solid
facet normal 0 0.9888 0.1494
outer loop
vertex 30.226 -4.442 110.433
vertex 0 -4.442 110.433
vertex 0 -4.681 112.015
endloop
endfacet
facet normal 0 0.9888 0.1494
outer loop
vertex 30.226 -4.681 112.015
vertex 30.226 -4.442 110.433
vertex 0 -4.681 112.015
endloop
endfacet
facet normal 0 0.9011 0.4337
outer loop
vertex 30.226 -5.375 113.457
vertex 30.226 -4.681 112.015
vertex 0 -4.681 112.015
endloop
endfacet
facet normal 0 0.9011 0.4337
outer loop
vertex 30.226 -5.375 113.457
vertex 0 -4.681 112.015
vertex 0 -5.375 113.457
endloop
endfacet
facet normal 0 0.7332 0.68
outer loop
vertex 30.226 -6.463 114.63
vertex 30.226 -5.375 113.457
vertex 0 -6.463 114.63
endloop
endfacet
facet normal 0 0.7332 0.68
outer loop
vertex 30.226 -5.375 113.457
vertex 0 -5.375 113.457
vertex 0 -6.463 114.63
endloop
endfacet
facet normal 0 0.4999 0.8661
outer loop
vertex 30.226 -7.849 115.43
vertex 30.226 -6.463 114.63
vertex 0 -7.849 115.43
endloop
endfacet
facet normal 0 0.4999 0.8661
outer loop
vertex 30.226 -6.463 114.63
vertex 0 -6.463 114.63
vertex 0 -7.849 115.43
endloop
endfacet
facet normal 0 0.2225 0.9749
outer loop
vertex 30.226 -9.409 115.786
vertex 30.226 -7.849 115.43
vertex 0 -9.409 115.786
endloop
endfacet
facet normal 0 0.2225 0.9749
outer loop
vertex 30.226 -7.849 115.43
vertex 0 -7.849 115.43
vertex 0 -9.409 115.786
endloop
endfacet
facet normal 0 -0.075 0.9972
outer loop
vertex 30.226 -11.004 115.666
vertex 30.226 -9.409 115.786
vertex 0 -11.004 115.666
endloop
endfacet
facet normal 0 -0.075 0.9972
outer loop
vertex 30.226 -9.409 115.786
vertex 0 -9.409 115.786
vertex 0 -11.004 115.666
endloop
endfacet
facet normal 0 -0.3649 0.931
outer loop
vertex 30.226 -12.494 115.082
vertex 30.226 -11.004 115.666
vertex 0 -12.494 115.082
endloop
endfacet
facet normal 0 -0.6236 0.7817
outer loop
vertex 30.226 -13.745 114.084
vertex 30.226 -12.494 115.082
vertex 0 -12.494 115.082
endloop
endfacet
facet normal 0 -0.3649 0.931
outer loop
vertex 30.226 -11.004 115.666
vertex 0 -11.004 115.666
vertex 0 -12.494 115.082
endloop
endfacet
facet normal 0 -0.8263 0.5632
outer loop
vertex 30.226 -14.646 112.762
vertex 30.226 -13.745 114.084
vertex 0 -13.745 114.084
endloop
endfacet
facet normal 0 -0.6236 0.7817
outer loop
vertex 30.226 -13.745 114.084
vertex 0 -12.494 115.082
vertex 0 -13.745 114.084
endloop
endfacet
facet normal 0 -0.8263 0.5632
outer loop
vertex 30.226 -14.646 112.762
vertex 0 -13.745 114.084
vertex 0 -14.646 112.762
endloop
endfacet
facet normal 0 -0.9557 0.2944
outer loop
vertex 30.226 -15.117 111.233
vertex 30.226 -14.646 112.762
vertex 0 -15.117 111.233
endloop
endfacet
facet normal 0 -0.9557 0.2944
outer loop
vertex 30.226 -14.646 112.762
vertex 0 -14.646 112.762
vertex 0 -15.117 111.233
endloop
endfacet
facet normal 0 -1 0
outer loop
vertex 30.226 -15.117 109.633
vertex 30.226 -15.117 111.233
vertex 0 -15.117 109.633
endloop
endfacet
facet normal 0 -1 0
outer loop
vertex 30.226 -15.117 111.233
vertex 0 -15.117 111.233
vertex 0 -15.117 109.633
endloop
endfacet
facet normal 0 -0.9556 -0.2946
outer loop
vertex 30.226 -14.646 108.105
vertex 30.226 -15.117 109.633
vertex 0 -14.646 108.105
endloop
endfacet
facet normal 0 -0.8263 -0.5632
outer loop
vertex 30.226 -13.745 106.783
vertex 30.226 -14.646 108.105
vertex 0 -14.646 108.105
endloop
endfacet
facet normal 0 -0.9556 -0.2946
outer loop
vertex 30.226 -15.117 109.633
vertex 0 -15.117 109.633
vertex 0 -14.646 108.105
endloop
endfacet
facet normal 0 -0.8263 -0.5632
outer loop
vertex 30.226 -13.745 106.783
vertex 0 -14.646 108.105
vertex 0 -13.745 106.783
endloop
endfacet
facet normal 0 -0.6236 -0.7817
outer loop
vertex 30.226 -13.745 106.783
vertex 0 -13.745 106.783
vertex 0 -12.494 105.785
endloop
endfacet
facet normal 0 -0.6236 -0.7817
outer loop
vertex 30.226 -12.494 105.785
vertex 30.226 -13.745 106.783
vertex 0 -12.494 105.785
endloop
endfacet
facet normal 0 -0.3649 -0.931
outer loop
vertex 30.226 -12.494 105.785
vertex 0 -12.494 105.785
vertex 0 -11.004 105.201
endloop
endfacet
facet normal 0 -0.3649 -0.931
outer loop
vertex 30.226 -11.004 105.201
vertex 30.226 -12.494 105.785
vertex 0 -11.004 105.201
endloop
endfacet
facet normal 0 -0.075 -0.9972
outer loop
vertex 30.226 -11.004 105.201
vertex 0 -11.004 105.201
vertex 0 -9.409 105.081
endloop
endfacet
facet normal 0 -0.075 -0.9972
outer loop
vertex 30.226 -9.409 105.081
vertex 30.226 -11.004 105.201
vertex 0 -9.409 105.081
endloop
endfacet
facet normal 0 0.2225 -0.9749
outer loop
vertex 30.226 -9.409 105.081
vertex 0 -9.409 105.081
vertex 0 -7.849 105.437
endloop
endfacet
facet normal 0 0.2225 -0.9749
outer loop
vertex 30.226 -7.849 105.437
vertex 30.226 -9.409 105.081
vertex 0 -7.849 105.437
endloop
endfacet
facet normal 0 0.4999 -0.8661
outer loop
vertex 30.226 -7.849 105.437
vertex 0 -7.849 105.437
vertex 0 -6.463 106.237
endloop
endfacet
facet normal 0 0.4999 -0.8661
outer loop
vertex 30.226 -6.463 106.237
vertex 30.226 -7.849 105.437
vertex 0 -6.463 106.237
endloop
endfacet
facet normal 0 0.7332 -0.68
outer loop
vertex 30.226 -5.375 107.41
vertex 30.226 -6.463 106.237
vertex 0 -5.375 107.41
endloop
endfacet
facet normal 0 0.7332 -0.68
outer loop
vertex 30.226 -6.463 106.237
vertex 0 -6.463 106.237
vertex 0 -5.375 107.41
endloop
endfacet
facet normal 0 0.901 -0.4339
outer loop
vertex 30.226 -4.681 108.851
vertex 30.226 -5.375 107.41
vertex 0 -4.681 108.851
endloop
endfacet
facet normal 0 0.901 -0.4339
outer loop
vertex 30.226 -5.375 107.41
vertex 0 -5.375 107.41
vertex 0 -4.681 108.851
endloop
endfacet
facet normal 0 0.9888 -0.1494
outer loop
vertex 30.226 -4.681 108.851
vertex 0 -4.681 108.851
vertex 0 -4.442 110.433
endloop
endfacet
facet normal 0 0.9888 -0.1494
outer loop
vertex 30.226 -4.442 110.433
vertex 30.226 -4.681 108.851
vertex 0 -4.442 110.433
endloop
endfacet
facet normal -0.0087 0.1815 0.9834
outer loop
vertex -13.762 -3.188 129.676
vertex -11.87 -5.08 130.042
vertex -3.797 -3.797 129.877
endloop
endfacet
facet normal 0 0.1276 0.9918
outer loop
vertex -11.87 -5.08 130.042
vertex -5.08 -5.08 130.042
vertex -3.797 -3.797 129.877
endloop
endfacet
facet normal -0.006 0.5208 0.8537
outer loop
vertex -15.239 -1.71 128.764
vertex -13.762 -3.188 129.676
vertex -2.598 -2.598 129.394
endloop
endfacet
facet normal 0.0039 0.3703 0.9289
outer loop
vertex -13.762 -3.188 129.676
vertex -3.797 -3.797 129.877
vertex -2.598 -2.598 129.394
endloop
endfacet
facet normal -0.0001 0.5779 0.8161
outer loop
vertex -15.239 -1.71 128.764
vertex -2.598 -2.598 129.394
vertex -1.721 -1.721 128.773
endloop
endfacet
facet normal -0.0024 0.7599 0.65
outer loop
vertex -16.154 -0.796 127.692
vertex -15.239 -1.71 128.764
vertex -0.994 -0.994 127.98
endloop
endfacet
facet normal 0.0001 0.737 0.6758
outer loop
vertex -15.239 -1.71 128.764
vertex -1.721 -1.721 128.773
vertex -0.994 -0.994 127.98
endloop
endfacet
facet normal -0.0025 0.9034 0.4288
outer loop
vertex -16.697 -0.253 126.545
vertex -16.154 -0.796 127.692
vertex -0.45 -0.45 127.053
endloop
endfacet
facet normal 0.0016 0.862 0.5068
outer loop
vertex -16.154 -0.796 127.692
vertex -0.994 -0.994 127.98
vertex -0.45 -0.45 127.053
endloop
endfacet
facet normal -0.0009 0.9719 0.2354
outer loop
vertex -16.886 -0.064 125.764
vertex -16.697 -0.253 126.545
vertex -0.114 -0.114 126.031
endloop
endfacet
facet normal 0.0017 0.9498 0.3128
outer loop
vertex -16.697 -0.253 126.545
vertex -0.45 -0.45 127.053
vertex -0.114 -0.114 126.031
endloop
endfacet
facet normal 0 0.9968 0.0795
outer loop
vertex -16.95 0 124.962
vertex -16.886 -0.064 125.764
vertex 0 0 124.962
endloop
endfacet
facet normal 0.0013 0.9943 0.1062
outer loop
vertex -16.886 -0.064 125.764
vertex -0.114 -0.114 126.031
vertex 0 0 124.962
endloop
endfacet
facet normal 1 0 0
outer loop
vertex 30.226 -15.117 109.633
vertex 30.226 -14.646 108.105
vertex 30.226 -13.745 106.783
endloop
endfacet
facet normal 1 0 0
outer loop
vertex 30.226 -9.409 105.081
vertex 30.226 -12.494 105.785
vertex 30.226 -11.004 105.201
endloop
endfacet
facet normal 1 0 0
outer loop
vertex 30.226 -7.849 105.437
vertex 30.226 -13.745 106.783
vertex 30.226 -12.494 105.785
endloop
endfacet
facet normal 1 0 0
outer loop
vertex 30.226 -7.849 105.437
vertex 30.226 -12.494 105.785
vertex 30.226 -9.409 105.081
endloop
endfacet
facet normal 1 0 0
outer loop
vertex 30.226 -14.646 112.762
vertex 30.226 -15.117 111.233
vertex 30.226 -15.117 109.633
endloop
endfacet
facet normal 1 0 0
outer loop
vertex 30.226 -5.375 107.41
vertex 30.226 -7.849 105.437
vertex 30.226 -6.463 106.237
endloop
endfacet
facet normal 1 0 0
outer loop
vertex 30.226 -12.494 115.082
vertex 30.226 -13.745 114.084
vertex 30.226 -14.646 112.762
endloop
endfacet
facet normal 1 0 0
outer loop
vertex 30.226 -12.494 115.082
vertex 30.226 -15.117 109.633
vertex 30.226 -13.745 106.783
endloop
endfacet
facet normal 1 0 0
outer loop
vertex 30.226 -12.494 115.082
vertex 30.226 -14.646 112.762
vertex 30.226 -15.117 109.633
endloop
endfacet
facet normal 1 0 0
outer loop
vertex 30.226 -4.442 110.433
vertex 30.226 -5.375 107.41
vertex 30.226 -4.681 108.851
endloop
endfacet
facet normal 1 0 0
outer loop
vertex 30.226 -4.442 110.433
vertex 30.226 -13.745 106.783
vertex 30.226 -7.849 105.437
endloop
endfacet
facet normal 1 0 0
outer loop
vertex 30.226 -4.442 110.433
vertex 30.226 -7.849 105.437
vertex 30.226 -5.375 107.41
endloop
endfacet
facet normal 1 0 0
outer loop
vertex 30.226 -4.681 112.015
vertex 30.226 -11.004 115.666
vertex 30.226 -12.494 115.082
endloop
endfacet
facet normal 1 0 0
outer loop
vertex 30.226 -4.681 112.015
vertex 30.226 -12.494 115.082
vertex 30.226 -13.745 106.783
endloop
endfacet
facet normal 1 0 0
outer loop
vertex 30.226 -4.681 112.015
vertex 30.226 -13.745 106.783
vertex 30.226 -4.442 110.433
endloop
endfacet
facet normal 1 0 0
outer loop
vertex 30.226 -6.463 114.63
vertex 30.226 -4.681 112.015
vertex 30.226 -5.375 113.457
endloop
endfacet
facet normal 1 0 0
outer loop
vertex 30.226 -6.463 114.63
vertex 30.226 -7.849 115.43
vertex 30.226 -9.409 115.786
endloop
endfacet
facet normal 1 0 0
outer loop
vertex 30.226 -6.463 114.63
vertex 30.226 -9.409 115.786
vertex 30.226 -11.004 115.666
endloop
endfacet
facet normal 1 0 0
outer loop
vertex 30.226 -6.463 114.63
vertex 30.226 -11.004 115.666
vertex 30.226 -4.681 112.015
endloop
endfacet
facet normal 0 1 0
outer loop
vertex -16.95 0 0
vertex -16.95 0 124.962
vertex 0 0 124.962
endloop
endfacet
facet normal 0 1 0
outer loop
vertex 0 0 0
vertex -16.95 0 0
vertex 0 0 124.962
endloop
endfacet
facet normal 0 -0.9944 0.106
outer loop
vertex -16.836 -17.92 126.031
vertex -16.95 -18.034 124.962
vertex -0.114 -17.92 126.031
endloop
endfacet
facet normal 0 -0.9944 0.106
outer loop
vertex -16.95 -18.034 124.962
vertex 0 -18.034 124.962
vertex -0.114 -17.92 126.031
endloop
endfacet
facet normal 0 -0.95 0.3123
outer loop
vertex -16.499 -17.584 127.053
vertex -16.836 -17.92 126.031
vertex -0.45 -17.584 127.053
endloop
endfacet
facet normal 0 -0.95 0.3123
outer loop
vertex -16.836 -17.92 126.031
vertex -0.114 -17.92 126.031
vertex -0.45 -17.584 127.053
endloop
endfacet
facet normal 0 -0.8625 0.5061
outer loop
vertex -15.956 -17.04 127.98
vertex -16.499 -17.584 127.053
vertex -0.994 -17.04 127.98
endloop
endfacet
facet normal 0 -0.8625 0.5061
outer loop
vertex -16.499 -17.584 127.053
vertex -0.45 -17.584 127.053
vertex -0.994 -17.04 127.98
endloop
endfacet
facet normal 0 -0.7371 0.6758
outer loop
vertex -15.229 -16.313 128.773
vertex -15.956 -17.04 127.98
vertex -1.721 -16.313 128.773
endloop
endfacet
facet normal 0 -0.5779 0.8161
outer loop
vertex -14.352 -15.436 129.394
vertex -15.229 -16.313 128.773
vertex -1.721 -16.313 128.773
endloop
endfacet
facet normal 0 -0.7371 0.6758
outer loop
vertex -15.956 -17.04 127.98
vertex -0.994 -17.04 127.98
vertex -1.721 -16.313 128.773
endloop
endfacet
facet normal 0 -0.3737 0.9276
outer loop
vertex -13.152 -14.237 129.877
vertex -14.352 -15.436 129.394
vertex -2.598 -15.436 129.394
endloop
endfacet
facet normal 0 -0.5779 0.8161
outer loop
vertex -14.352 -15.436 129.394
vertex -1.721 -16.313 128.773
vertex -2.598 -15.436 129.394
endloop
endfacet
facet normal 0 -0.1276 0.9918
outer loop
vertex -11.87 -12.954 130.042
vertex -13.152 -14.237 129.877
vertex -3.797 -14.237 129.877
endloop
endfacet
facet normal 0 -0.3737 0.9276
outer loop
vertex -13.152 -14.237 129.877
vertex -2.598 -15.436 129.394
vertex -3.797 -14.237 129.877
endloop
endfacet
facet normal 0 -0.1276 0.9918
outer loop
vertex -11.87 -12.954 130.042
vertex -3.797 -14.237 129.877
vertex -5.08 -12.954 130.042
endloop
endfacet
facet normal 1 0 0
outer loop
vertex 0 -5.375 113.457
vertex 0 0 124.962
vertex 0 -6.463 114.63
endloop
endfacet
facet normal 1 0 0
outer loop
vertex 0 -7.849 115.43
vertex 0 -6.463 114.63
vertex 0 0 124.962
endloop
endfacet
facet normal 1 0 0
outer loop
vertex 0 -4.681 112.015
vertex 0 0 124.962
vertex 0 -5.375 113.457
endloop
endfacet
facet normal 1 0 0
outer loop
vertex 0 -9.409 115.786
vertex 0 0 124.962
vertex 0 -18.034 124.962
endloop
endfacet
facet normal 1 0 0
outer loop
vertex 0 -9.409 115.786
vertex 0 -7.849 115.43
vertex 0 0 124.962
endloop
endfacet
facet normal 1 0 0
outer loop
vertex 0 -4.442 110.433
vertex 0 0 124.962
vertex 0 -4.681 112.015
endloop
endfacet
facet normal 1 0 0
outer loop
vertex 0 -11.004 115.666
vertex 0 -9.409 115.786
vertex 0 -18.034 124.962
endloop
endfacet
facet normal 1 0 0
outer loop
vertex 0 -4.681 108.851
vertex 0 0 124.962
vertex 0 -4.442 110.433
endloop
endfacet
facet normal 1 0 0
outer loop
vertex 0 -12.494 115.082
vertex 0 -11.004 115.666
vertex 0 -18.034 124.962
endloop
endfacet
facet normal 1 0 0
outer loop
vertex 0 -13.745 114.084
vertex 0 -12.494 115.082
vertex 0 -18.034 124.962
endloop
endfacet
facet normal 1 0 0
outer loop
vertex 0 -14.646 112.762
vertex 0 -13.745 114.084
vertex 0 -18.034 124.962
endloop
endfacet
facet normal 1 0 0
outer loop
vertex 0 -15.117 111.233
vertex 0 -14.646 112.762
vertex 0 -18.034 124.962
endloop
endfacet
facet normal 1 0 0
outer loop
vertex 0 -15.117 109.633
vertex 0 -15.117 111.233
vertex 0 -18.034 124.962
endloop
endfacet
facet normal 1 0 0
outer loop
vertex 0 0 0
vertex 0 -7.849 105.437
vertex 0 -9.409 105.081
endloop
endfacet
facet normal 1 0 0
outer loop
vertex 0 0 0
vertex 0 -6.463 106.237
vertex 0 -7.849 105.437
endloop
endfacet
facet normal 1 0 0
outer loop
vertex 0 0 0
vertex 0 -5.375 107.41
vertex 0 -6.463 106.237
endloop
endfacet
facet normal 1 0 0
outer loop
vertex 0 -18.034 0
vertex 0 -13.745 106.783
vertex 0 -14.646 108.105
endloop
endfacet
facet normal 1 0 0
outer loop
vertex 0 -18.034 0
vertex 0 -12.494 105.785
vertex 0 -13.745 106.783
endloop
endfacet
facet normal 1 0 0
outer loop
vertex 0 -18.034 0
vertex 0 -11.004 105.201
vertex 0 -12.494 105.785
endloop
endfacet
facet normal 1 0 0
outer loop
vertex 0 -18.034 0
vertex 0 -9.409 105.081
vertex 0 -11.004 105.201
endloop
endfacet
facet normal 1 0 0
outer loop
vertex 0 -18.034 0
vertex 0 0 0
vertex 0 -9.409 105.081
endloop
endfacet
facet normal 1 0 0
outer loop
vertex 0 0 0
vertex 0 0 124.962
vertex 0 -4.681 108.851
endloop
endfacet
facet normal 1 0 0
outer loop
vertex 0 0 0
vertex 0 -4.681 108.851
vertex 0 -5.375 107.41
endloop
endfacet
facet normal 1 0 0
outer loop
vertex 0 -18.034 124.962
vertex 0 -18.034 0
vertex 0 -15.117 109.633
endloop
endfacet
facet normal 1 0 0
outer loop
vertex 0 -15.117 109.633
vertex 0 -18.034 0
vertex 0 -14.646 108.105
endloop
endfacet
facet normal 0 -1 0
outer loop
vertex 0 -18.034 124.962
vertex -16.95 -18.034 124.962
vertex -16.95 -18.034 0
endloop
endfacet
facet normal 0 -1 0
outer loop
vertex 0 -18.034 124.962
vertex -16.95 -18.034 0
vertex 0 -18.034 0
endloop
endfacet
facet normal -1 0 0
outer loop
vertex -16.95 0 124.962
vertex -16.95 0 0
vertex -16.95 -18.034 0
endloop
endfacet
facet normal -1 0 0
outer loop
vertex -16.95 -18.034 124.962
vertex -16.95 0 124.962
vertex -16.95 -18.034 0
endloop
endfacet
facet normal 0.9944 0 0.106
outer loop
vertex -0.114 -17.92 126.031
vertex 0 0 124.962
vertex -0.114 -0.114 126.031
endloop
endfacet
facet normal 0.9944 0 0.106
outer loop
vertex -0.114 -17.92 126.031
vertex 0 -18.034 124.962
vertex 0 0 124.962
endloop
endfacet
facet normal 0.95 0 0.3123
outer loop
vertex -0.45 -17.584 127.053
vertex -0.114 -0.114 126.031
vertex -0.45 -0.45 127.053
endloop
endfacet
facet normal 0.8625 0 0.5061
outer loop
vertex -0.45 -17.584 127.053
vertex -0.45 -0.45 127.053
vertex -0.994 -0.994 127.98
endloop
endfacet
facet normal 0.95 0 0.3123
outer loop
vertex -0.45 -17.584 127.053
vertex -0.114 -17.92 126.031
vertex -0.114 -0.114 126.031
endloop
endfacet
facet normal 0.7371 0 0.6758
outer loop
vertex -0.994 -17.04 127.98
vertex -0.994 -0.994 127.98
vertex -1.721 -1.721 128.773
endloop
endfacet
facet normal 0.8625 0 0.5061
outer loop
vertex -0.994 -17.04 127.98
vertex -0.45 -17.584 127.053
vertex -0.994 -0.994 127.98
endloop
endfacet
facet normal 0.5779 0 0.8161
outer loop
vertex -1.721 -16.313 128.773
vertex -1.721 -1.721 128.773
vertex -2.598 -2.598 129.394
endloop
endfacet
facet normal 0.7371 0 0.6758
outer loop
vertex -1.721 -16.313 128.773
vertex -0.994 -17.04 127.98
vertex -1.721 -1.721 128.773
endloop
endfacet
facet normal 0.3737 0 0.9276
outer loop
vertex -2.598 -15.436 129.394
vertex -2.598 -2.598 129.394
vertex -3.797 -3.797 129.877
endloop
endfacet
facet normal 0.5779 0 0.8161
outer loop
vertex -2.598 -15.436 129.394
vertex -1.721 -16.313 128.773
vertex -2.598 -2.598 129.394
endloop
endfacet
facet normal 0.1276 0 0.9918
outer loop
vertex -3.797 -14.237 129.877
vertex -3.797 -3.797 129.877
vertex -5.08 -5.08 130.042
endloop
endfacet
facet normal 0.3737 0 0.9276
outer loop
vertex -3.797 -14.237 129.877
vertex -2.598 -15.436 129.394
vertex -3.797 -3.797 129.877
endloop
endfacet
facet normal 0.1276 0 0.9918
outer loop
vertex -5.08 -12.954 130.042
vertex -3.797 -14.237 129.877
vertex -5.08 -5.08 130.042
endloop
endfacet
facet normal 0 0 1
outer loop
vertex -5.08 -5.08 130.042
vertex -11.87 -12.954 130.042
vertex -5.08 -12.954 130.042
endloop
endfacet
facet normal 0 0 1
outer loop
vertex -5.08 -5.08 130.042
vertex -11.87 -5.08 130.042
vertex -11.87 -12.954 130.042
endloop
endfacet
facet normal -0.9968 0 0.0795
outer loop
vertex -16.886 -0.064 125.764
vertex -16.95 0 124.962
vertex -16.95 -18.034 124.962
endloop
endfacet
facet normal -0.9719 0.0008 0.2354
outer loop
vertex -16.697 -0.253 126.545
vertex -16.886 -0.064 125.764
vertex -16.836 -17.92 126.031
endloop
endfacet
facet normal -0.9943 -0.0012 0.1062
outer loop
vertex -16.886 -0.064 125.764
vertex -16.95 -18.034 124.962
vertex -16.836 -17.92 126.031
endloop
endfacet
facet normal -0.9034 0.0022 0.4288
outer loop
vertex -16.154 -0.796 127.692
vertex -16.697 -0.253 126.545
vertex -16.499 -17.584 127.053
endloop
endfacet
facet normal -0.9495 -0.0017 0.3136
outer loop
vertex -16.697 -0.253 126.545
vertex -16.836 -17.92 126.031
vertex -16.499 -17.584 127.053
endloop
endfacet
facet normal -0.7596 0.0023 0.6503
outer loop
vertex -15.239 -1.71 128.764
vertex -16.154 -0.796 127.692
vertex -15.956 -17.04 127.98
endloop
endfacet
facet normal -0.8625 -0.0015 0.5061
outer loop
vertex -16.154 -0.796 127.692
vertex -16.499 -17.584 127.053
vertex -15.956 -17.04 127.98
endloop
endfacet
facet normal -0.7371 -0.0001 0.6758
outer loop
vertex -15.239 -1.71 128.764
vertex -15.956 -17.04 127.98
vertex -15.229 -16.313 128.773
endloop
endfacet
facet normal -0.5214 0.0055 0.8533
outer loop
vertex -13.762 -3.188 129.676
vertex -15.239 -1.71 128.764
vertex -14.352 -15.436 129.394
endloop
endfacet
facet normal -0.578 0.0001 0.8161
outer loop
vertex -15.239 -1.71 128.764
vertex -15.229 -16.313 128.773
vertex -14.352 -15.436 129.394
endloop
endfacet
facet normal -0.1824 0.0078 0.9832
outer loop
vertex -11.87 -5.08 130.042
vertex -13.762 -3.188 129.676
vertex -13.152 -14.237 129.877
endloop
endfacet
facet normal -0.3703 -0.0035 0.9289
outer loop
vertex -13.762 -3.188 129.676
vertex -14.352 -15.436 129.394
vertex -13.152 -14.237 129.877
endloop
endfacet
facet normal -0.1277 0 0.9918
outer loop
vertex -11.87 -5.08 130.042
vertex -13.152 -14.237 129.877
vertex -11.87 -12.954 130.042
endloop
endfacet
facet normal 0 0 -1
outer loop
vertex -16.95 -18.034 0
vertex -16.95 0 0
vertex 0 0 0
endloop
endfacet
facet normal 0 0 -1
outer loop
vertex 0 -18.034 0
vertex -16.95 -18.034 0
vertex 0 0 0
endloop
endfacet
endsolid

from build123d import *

# Parameters (mm, degrees)
F0_W     = 16.9495176524
F0_H     = 58.9220710099
F1_DEPTH = 18.034
F2_DEPTH = 71.12
F3_R     = 5.08
F4_R     = 5.367457486
F5_DEPTH = 30.226


with BuildPart() as f1:
    # F0 (on Front) → F1 (new body)
    with BuildSketch(Plane.XZ):
        with Locations((-8.4747588262, 29.4610355049)):
            Rectangle(F0_W, F0_H)
    extrude(amount=F1_DEPTH)

    # F2 (add): a face of the model
    f2_faces = [f1.faces().sort_by_distance(p)[0] for p in [
        (-8.4747588262, -9.017, 58.9220710099),
    ]]
    extrude(f2_faces, amount=F2_DEPTH)

    # F3
    f3_edges = [f1.edges().sort_by_distance(p)[0] for p in [
        (-8.474759, -18.034, 130.042071),
        (0, -9.017, 130.042071),
        (-8.474759, 0, 130.042071),
        (-16.949518, -9.017, 130.042071),
    ]]
    fillet(f3_edges, radius=F3_R)

    # F4 (on face) → F5 (join)
    with BuildSketch(Plane.YZ):
        with Locations((-9.8099326715, 110.4333996773)):
            Circle(F4_R)
    extrude(amount=F5_DEPTH)


solid = f1.part
